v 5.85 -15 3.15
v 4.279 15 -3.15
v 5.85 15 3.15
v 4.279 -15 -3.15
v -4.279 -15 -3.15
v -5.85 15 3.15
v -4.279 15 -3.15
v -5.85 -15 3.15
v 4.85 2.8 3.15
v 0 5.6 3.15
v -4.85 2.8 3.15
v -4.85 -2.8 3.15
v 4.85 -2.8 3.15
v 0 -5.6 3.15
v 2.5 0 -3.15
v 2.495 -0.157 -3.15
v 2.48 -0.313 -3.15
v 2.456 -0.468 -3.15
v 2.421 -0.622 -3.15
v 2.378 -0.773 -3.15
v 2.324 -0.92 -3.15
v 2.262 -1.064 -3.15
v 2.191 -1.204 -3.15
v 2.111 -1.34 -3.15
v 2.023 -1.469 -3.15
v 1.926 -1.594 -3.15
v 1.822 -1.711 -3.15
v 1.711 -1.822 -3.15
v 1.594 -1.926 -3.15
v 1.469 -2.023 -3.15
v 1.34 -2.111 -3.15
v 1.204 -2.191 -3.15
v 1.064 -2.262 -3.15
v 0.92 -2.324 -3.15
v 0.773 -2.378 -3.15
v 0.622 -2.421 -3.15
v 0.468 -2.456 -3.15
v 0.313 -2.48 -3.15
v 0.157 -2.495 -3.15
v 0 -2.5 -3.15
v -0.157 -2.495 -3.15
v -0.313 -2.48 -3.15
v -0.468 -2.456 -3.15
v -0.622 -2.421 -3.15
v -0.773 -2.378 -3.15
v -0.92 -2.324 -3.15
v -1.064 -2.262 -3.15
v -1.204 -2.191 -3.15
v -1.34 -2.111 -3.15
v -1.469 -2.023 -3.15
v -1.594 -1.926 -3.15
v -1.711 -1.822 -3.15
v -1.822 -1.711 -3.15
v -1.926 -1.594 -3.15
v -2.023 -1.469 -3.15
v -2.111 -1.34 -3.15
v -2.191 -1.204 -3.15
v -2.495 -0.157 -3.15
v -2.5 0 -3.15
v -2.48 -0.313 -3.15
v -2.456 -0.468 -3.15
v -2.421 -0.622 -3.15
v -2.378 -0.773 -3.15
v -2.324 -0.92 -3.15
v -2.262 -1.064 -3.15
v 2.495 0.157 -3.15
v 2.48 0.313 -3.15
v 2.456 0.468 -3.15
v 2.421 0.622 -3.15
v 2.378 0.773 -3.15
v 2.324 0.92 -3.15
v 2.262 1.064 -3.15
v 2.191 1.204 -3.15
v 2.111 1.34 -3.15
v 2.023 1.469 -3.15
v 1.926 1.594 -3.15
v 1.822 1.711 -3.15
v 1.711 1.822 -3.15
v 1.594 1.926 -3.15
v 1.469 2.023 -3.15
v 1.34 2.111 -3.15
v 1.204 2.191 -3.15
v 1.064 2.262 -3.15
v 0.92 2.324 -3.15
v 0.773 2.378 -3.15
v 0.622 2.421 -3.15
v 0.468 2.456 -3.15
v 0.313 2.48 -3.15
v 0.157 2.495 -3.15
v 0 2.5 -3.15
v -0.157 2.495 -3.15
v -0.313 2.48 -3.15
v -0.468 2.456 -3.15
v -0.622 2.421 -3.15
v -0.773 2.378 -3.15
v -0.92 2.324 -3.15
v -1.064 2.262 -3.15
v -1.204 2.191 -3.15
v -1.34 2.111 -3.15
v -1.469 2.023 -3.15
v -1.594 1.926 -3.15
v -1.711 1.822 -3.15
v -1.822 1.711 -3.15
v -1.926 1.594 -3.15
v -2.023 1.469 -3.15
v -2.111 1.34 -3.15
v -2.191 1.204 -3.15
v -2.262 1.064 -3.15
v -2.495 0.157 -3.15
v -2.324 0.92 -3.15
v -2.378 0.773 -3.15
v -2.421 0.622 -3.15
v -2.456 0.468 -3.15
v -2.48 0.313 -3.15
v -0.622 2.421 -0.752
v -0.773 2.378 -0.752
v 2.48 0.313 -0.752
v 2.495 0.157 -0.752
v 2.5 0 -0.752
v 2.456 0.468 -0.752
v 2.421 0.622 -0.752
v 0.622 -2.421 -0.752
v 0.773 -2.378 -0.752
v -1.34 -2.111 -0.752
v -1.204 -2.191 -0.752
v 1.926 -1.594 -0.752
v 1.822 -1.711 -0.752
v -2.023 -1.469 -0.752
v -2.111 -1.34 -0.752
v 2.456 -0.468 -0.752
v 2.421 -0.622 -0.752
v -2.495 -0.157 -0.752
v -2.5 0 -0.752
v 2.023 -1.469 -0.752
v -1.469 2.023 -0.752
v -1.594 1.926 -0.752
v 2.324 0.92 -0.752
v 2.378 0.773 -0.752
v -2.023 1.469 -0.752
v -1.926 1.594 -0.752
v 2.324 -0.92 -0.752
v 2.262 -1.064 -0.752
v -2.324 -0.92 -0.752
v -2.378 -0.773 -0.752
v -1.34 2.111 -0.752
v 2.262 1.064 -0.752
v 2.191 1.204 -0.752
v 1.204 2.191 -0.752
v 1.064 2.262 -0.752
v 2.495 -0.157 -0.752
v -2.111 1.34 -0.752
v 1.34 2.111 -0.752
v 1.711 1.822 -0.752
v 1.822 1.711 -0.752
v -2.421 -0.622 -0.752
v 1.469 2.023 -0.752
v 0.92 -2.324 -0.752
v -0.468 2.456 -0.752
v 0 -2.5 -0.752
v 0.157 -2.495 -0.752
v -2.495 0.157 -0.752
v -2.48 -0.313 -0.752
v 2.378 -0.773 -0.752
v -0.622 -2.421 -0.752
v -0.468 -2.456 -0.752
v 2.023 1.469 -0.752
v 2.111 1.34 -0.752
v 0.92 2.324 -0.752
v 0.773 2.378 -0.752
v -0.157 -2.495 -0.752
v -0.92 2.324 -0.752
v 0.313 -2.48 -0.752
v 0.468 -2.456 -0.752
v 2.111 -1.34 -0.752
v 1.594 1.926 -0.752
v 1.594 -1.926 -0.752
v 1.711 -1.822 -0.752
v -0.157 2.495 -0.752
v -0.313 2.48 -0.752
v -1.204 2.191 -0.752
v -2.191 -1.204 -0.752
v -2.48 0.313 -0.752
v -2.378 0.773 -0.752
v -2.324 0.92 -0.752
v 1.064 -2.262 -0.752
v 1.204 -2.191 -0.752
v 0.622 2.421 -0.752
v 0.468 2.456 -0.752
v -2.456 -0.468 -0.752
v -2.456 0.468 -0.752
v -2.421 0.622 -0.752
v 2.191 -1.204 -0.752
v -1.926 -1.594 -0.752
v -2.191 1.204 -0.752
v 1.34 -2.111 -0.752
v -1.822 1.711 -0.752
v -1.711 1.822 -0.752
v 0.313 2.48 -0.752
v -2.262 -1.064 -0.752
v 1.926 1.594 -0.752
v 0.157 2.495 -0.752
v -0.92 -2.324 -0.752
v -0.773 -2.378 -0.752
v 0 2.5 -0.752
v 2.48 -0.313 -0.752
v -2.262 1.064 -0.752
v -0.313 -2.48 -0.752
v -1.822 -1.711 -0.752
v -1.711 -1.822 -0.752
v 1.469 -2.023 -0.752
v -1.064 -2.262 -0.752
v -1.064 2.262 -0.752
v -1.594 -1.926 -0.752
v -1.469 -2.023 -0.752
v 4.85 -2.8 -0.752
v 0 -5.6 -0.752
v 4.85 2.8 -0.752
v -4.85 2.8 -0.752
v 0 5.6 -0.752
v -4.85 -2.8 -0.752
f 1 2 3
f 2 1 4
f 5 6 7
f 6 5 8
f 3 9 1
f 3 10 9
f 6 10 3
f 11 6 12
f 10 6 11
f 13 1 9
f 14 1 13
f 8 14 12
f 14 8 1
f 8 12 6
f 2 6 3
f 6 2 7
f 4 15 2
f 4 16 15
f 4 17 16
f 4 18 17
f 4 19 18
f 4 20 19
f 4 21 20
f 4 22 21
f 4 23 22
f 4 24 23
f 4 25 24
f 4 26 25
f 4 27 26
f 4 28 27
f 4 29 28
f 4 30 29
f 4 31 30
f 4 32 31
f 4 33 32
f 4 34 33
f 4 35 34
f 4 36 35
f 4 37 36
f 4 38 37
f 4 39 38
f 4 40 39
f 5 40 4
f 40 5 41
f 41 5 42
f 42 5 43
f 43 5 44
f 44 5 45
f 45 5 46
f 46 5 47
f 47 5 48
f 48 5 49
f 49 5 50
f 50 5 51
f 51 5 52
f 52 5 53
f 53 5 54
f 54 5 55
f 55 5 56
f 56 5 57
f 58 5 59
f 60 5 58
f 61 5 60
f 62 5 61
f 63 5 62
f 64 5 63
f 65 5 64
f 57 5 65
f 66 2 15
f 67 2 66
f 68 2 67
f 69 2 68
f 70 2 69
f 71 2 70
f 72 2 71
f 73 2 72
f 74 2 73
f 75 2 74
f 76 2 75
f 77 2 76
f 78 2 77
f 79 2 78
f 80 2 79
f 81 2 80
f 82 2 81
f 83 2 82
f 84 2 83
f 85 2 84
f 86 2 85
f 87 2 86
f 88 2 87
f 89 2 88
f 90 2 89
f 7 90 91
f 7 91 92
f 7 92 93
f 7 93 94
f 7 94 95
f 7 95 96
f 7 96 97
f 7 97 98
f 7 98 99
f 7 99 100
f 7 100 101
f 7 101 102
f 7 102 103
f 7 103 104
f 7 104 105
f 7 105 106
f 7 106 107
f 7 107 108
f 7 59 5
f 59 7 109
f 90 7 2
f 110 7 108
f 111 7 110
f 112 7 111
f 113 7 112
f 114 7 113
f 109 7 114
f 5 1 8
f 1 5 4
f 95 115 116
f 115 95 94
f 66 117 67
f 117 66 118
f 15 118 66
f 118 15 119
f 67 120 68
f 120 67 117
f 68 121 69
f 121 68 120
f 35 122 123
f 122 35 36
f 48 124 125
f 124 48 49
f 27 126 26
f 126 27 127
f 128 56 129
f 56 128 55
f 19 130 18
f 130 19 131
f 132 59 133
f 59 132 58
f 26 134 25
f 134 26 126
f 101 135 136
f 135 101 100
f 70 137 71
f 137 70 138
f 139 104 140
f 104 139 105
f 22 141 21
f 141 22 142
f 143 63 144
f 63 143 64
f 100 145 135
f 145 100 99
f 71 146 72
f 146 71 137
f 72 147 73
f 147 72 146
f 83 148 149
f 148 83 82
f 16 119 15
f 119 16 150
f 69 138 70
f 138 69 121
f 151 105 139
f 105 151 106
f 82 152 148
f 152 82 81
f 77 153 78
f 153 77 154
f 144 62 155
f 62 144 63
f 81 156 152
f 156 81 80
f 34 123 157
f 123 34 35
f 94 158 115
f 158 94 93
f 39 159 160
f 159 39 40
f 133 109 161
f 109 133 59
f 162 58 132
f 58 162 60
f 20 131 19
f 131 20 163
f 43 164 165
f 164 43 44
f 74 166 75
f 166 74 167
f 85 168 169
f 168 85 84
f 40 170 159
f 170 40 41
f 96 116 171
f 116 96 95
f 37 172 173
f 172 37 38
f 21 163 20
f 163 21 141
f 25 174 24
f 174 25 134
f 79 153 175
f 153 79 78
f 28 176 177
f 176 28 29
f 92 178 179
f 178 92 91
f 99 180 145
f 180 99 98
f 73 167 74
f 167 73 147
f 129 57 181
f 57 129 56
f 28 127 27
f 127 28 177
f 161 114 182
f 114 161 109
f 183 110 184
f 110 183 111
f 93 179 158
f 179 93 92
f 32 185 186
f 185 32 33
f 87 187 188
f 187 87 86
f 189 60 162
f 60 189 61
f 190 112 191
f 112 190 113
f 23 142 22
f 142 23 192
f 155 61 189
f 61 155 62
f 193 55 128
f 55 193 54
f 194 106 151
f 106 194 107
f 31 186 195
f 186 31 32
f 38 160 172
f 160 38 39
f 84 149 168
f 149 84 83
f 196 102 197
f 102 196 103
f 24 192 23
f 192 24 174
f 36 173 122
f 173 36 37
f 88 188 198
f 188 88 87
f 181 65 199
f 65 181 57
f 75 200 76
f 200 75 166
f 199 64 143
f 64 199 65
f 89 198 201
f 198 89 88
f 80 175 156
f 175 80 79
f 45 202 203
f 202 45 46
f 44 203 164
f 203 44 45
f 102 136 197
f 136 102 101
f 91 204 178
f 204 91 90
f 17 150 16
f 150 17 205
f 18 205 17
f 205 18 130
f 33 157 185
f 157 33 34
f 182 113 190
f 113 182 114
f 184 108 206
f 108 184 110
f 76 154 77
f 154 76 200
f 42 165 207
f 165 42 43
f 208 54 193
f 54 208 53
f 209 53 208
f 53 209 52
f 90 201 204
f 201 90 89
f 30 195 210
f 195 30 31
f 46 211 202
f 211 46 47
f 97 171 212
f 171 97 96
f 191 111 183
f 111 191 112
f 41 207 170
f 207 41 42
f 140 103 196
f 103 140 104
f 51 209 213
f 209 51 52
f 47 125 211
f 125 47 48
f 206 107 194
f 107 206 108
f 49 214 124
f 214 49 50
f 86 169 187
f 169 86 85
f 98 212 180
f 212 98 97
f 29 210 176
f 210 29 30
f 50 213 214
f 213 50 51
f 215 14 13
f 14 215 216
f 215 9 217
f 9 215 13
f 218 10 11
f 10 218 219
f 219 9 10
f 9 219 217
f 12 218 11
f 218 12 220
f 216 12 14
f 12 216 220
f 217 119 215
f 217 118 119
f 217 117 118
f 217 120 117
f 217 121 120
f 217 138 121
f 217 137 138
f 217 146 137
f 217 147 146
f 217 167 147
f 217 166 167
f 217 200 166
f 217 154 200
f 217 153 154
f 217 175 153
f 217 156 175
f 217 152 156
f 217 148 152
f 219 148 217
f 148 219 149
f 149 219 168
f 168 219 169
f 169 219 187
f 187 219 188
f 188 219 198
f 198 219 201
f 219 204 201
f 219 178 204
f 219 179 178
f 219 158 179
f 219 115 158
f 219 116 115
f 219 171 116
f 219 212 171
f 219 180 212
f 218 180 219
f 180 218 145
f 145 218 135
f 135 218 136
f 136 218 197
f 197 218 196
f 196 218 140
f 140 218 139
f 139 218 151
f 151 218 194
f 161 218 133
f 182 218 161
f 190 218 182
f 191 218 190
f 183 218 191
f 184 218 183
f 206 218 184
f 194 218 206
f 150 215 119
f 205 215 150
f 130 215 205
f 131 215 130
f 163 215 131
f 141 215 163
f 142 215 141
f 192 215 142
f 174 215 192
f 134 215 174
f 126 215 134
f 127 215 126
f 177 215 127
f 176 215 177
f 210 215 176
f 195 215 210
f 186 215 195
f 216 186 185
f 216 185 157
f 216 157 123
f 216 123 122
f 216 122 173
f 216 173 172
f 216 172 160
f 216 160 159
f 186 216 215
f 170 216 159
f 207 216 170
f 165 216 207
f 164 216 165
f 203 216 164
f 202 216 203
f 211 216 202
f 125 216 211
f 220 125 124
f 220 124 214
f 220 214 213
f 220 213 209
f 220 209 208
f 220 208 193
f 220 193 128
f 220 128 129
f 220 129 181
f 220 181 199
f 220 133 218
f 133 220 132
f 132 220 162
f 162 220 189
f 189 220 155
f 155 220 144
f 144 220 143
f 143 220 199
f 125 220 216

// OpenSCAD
/************** BEST VIEWED IN A CODE EDITOR 80 COLUMNS WIDE *******************
*
* Key for dovetail groove
* Benjamen Johnson <workshop.electronsmith.com>
* 20190703
* Version 1
* openSCAD Version: 2015.03-2 
*******************************************************************************/

/*******************************************************************************
        |<----   base   --->|
         ------------------- ---
angle ->|\                 /  |
        | \               /   height 
        |  \             /    |
             -----------     ---

         ------------------------------
        |                              |
        |                              |
        |                              |
         ------------------------------
        | <--------   length  -------->|
*******************************************************************************/
// base measurement of the dovetail
base = 11.7;

// height of the dovetail
height = 6.3;

// dovetail angle
angle = 14;

// length of the dovetail key
length = 30;

/*******************************************************************************

        ---                              --------  ---
      /     \ < -- bolt_pt_to_pt_dia    |        |  bolt_head_thickness
  --> \     /                            --------  ---
        ---                                |  |
                                       --> |  | <-- bolt_staft_dia
                                           |  |

*******************************************************************************/
// width of bolt head point to point
bolt_pt_to_pt_dia = 11.2;

// how thick is th bolt head
bolt_head_thickness = 3.9;

// bolt shaft diameter
bolt_shaft_dia = 5;

//calculate the coordinate for the narrow part of the dovetail
x=tan(angle)*height;

// Add a tiny amount to make holes render better
render_offset=0.005;

difference(){
    //form the dovetail
    rotate([-90,0,0])linear_extrude(height=length, center=true,convexity = 10) translate([-base/2,-height/2,0])polygon(points=[[0,0],[base,0],[base-x,height],[x,height]]);

    //drill the shaft hole
    cylinder(h=height+render_offset, d=bolt_shaft_dia, center=true, $fn=100);
    
    // inlay the bolt head
    rotate([0,0,30])translate([0,0,(height - bolt_head_thickness)/2])cylinder(h=bolt_head_thickness+render_offset, d=bolt_pt_to_pt_dia, center=true, $fn=6);
}
